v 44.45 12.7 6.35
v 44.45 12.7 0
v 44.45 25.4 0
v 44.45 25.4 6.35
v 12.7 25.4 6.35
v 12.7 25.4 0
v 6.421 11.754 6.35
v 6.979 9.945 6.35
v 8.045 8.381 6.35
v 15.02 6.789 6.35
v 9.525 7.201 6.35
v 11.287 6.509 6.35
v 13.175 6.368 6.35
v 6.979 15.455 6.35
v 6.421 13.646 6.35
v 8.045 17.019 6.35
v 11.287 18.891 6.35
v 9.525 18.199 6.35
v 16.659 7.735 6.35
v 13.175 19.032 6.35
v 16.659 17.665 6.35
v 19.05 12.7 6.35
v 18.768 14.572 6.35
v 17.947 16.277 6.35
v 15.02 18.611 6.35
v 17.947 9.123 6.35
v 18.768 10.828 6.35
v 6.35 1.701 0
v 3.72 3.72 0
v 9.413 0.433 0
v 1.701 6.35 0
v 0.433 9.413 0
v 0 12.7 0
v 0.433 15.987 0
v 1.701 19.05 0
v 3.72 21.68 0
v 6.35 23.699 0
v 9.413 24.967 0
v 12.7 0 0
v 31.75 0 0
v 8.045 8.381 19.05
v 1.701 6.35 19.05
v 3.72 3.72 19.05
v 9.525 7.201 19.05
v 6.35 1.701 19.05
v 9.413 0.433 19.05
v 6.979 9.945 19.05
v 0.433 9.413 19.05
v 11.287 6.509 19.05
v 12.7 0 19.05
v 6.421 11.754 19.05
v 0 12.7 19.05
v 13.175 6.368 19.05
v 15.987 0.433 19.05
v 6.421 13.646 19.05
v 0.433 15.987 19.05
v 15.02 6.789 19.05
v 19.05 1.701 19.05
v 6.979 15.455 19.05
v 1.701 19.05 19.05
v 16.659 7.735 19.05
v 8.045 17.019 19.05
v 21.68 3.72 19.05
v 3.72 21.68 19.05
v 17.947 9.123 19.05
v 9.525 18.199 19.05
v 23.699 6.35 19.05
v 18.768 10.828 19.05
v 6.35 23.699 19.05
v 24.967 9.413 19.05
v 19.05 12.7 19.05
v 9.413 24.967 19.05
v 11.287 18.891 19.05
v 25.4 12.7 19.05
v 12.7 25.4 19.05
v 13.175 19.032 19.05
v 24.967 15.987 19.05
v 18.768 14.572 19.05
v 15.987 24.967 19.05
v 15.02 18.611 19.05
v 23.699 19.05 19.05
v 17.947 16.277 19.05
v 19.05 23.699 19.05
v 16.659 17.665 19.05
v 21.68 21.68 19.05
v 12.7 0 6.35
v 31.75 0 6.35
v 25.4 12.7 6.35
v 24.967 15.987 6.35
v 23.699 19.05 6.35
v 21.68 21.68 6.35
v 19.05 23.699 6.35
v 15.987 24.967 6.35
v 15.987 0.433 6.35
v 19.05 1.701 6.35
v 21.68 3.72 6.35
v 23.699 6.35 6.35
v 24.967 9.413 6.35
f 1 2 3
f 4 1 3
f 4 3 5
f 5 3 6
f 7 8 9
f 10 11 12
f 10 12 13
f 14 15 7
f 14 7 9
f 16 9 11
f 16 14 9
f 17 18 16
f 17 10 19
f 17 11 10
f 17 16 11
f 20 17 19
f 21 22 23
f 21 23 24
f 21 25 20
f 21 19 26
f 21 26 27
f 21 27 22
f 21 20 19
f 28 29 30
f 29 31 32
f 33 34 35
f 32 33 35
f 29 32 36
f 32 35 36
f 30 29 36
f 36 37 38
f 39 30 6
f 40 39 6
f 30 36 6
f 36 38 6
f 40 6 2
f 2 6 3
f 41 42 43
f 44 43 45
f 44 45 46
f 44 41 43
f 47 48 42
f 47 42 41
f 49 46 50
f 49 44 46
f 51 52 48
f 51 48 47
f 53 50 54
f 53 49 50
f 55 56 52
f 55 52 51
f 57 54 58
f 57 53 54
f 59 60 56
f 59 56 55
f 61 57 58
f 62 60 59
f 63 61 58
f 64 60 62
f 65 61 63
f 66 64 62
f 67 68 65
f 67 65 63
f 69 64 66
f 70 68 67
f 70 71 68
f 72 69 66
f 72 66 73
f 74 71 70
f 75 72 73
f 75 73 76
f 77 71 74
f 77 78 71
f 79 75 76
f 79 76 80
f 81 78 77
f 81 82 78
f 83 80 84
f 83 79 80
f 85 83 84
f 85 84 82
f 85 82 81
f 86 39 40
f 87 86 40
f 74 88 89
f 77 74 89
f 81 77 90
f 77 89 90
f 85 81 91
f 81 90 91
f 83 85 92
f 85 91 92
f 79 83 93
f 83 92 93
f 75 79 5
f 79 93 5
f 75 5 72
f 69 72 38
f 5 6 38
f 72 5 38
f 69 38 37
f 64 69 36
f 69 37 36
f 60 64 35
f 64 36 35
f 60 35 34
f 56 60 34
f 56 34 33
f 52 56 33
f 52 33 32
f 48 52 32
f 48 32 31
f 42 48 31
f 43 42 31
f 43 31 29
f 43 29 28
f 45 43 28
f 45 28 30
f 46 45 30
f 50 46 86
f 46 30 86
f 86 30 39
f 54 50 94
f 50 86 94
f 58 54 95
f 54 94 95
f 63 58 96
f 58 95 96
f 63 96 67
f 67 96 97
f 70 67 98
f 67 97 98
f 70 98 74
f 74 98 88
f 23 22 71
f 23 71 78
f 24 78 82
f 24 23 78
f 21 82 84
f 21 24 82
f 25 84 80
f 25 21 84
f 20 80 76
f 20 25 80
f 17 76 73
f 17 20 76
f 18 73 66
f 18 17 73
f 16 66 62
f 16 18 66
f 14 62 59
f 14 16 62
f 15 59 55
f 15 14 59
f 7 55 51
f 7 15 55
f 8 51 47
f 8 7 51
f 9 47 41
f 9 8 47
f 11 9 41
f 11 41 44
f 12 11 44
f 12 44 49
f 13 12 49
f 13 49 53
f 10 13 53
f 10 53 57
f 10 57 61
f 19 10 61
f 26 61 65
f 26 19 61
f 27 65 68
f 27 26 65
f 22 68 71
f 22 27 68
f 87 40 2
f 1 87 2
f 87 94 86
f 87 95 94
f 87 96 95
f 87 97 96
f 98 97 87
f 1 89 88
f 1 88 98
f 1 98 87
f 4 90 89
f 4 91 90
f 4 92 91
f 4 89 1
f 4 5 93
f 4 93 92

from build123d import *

# Parameters (mm, degrees)
F1_DEPTH = 6.35
F2_R     = 12.7
F2_R_2   = 6.35
F3_DEPTH = 12.7


with BuildPart() as f1:
    # F0 (on Top) → F1 (new body)
    with BuildSketch(Plane.XY):
        with BuildLine():
            Line((44.45, 25.4), (12.7, 25.4))
            ThreePointArc((12.7, 25.4), (0, 12.7), (12.7, 0))
            Line((12.7, 0), (31.75, 0))
            Line((31.75, 0), (44.45, 12.7))
            Line((44.45, 12.7), (44.45, 25.4))
        make_face()
    extrude(amount=F1_DEPTH)

    # F2 (on face) → F3 (join)
    with BuildSketch(Plane.XY.offset(6.35)):
        with Locations((12.7, 12.7)):
            Circle(F2_R)
        with Locations((12.7, 12.7)):
            Circle(F2_R_2, mode=Mode.SUBTRACT)
    extrude(amount=F3_DEPTH)


solid = f1.part
